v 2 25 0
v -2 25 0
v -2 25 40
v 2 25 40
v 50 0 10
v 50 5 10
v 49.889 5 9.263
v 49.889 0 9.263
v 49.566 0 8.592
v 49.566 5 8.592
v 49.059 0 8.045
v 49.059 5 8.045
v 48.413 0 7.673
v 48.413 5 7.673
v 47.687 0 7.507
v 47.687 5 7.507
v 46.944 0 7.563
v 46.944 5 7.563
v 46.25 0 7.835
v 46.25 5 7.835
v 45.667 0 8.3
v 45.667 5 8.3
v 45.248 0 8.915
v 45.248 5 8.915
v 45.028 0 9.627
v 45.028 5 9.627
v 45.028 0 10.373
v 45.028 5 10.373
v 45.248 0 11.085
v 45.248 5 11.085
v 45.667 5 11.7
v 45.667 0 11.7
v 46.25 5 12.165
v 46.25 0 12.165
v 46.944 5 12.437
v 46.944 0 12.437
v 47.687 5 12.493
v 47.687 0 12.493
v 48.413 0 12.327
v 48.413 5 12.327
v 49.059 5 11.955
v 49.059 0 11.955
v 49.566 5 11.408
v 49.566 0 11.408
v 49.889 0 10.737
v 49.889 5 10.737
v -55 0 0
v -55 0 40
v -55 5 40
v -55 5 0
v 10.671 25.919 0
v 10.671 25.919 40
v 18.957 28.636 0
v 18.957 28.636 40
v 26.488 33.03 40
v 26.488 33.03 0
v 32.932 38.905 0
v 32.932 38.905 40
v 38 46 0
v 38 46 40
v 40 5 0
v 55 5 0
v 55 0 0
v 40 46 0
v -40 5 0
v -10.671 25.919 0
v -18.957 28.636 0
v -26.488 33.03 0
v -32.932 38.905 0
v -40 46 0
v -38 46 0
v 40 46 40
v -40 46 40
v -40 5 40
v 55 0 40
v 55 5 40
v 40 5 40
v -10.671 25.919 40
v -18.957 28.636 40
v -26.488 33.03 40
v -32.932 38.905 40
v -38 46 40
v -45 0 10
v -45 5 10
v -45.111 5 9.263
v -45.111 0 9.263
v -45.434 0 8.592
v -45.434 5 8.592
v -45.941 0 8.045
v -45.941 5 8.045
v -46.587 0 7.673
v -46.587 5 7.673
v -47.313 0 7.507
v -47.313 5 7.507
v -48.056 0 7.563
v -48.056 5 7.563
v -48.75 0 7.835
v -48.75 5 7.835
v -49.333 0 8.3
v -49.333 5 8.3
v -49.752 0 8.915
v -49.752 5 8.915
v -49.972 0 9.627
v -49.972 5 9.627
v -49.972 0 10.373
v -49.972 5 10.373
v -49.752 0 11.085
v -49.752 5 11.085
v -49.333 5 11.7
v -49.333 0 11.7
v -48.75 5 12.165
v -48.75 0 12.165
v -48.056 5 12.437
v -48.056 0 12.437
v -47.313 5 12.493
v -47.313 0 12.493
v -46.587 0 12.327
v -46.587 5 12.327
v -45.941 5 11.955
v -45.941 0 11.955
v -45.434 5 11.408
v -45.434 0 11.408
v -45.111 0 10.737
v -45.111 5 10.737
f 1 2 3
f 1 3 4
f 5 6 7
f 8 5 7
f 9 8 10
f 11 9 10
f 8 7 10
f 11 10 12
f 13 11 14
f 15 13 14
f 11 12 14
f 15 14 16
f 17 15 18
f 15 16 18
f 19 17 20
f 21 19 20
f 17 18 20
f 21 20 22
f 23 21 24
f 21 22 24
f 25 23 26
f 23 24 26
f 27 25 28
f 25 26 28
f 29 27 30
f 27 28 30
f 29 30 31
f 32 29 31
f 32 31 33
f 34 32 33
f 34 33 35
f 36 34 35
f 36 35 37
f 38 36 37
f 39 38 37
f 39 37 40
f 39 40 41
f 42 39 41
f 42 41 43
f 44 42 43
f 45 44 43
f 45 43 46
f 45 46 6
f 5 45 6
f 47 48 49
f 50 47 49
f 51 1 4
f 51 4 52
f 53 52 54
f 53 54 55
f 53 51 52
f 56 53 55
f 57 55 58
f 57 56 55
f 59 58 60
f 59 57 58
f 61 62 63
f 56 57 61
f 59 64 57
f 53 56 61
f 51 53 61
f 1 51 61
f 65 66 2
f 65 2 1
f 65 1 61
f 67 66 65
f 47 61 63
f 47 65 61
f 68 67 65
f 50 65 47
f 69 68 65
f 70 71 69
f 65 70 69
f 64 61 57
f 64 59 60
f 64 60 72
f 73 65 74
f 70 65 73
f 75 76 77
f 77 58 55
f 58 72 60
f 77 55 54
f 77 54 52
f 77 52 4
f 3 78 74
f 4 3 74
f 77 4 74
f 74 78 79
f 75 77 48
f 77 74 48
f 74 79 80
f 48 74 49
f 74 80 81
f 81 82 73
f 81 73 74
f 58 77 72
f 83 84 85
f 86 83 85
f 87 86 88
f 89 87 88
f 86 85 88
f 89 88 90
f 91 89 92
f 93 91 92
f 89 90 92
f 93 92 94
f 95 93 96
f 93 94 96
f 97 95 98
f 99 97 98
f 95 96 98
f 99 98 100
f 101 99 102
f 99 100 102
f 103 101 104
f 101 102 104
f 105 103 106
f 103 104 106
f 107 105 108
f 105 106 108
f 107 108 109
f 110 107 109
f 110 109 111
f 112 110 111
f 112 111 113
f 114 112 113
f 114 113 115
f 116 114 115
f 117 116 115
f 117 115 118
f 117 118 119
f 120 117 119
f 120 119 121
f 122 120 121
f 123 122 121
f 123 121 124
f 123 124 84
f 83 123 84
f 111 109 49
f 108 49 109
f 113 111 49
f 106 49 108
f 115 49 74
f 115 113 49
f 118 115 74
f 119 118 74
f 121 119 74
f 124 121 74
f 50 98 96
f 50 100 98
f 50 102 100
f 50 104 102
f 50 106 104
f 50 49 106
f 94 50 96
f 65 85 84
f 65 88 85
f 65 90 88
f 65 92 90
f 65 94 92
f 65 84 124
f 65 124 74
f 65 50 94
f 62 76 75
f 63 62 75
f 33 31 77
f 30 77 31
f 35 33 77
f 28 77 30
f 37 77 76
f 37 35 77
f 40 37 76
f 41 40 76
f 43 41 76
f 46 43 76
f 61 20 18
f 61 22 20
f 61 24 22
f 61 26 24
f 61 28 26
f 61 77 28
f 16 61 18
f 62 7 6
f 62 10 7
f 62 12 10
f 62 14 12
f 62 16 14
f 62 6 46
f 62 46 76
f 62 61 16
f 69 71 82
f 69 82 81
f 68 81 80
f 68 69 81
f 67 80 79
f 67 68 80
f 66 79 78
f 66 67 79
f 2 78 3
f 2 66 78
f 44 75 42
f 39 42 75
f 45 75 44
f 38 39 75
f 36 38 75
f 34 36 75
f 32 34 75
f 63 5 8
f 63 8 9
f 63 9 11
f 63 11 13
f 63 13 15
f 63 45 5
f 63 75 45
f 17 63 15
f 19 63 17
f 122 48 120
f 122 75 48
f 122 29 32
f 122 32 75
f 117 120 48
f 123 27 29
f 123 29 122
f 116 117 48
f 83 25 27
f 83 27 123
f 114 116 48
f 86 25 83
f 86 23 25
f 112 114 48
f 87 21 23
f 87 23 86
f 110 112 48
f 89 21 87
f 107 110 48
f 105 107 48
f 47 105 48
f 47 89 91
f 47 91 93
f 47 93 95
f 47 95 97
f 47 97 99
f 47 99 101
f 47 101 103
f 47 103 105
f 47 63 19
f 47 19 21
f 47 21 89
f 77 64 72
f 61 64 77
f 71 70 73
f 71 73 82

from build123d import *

# Parameters (mm, degrees)
BOSS_EXTRUDE1_DEPTH = 40
SKETCH3_R           = 2.5
CUT_EXTRUDE1_DEPTH  = 40


with BuildPart() as part:
    # Sketch1 → Boss-Extrude1 (new body)
    with BuildSketch(Plane.XY):
        with BuildLine():
            Line((55, 0), (-55, 0))
            Line((-55, 0), (-55, 5))
            Line((-55, 5), (-40, 5))
            Line((-40, 5), (-40, 46))
            Line((-40, 46), (-38, 46))
            ThreePointArc((-38, 46), (-22.838665984, 30.633715456), (-2, 25))
            Line((-2, 25), (2, 25))
            ThreePointArc((2, 25), (22.838665984, 30.633715456), (38, 46))
            Line((38, 46), (40, 46))
            Line((40, 46), (40, 5))
            Line((40, 5), (55, 5))
            Line((55, 5), (55, 0))
        make_face()
    extrude(amount=BOSS_EXTRUDE1_DEPTH)

    # Sketch3 → Cut-Extrude1 (cut)
    with BuildSketch(Plane(origin=(0, 5, 0), x_dir=(1, 0, 0), z_dir=(0, 1, 0))):
        with Locations((-47.5, -10)):
            Circle(SKETCH3_R)
        with Locations((47.5, -10)):
            Circle(SKETCH3_R)
    extrude(amount=-CUT_EXTRUDE1_DEPTH, mode=Mode.SUBTRACT)


solid = part.part
